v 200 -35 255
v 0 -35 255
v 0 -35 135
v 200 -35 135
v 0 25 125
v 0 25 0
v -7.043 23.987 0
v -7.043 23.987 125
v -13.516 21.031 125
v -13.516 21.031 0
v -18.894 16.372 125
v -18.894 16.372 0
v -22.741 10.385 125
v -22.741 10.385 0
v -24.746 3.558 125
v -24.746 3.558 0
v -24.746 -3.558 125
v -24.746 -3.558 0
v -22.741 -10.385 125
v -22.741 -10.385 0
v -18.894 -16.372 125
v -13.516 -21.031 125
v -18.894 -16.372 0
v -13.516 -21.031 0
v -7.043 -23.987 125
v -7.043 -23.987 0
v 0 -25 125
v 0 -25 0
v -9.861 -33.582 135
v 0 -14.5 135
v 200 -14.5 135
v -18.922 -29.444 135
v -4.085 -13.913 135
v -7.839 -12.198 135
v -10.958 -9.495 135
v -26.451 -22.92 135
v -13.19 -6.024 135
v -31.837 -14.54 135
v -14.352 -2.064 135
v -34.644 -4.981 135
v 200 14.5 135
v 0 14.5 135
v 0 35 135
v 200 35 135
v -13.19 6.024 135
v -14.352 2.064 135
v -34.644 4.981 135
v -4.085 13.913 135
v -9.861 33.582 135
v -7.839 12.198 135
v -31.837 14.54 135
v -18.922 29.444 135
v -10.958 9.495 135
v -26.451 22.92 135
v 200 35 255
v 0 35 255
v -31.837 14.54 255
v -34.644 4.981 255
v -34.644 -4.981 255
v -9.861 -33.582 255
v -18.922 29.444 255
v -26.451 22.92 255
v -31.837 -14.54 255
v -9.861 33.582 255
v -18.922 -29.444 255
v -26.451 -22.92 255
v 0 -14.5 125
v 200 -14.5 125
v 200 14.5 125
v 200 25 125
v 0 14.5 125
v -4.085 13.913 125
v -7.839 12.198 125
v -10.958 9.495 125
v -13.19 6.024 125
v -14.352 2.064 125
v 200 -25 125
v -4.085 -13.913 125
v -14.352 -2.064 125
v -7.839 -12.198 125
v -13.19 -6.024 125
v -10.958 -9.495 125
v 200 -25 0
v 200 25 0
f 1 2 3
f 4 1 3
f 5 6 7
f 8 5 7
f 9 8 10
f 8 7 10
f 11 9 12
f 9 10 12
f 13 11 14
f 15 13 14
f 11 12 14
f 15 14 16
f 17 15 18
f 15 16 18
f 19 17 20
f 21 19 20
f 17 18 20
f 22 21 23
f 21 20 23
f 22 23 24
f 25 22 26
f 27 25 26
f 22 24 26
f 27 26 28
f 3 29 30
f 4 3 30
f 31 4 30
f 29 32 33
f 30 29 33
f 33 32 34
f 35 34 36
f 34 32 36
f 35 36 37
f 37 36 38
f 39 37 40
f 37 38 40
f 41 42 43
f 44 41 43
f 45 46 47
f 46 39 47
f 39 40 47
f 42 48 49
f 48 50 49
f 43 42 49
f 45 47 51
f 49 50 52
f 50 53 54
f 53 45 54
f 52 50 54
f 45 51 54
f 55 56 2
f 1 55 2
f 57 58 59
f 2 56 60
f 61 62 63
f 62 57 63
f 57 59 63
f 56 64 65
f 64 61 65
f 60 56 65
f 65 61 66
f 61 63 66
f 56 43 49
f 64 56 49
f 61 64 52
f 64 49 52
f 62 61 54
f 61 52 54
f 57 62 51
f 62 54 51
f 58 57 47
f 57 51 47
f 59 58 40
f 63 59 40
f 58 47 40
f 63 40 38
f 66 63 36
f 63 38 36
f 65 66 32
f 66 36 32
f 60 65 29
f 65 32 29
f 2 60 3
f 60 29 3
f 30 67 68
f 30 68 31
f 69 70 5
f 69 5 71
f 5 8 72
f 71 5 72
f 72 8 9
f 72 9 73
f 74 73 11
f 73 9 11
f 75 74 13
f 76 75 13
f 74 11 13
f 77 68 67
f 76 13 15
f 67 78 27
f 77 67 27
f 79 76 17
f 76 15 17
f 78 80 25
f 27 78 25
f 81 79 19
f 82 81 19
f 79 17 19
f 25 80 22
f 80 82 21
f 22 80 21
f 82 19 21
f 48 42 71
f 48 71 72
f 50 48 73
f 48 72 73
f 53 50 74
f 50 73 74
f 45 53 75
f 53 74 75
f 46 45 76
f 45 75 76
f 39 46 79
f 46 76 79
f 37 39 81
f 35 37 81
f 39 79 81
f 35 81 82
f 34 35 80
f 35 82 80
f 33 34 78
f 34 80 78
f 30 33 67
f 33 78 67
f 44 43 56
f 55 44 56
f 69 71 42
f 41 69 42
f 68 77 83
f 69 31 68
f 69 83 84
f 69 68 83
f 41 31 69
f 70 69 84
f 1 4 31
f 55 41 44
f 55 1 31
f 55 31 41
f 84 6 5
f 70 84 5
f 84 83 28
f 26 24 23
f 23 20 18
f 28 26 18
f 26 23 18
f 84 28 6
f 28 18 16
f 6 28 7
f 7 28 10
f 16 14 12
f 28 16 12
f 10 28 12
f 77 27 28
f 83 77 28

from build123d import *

# Parameters (mm, degrees)
F0_R     = 25
F1_DEPTH = 125
F2_R     = 14.5
F3_DEPTH = 10
F4_R     = 35
F5_DEPTH = 120
F6_W     = 29
F6_H     = 10
F7_DEPTH = 200


with BuildPart() as f1:
    # F0 (on Top) → F1 (new body)
    with BuildSketch(Plane.XY):
        Circle(F0_R)
    extrude(amount=F1_DEPTH)

    # F2 (on face) → F3 (join)
    with BuildSketch(Plane.XY.offset(125)):
        Circle(F2_R)
    extrude(amount=F3_DEPTH)

    # F4 (on face) → F5 (join)
    with BuildSketch(Plane.XY.offset(135)):
        Circle(F4_R)
    extrude(amount=F5_DEPTH)

    # F6 (on Right) → F7 (join)
    with BuildSketch(Plane.YZ):
        Polygon((-35, 255), (-35, 135), (-14.5, 135), (14.5, 135), (35, 135), (35, 255), align=None)
        with Locations((0, 130)):
            Rectangle(F6_W, F6_H)
        Polygon((14.5, 125), (-14.5, 125), (-25, 125), (-25, 0), (25, 0), (25, 125), align=None)
    extrude(amount=F7_DEPTH)


solid = f1.part
